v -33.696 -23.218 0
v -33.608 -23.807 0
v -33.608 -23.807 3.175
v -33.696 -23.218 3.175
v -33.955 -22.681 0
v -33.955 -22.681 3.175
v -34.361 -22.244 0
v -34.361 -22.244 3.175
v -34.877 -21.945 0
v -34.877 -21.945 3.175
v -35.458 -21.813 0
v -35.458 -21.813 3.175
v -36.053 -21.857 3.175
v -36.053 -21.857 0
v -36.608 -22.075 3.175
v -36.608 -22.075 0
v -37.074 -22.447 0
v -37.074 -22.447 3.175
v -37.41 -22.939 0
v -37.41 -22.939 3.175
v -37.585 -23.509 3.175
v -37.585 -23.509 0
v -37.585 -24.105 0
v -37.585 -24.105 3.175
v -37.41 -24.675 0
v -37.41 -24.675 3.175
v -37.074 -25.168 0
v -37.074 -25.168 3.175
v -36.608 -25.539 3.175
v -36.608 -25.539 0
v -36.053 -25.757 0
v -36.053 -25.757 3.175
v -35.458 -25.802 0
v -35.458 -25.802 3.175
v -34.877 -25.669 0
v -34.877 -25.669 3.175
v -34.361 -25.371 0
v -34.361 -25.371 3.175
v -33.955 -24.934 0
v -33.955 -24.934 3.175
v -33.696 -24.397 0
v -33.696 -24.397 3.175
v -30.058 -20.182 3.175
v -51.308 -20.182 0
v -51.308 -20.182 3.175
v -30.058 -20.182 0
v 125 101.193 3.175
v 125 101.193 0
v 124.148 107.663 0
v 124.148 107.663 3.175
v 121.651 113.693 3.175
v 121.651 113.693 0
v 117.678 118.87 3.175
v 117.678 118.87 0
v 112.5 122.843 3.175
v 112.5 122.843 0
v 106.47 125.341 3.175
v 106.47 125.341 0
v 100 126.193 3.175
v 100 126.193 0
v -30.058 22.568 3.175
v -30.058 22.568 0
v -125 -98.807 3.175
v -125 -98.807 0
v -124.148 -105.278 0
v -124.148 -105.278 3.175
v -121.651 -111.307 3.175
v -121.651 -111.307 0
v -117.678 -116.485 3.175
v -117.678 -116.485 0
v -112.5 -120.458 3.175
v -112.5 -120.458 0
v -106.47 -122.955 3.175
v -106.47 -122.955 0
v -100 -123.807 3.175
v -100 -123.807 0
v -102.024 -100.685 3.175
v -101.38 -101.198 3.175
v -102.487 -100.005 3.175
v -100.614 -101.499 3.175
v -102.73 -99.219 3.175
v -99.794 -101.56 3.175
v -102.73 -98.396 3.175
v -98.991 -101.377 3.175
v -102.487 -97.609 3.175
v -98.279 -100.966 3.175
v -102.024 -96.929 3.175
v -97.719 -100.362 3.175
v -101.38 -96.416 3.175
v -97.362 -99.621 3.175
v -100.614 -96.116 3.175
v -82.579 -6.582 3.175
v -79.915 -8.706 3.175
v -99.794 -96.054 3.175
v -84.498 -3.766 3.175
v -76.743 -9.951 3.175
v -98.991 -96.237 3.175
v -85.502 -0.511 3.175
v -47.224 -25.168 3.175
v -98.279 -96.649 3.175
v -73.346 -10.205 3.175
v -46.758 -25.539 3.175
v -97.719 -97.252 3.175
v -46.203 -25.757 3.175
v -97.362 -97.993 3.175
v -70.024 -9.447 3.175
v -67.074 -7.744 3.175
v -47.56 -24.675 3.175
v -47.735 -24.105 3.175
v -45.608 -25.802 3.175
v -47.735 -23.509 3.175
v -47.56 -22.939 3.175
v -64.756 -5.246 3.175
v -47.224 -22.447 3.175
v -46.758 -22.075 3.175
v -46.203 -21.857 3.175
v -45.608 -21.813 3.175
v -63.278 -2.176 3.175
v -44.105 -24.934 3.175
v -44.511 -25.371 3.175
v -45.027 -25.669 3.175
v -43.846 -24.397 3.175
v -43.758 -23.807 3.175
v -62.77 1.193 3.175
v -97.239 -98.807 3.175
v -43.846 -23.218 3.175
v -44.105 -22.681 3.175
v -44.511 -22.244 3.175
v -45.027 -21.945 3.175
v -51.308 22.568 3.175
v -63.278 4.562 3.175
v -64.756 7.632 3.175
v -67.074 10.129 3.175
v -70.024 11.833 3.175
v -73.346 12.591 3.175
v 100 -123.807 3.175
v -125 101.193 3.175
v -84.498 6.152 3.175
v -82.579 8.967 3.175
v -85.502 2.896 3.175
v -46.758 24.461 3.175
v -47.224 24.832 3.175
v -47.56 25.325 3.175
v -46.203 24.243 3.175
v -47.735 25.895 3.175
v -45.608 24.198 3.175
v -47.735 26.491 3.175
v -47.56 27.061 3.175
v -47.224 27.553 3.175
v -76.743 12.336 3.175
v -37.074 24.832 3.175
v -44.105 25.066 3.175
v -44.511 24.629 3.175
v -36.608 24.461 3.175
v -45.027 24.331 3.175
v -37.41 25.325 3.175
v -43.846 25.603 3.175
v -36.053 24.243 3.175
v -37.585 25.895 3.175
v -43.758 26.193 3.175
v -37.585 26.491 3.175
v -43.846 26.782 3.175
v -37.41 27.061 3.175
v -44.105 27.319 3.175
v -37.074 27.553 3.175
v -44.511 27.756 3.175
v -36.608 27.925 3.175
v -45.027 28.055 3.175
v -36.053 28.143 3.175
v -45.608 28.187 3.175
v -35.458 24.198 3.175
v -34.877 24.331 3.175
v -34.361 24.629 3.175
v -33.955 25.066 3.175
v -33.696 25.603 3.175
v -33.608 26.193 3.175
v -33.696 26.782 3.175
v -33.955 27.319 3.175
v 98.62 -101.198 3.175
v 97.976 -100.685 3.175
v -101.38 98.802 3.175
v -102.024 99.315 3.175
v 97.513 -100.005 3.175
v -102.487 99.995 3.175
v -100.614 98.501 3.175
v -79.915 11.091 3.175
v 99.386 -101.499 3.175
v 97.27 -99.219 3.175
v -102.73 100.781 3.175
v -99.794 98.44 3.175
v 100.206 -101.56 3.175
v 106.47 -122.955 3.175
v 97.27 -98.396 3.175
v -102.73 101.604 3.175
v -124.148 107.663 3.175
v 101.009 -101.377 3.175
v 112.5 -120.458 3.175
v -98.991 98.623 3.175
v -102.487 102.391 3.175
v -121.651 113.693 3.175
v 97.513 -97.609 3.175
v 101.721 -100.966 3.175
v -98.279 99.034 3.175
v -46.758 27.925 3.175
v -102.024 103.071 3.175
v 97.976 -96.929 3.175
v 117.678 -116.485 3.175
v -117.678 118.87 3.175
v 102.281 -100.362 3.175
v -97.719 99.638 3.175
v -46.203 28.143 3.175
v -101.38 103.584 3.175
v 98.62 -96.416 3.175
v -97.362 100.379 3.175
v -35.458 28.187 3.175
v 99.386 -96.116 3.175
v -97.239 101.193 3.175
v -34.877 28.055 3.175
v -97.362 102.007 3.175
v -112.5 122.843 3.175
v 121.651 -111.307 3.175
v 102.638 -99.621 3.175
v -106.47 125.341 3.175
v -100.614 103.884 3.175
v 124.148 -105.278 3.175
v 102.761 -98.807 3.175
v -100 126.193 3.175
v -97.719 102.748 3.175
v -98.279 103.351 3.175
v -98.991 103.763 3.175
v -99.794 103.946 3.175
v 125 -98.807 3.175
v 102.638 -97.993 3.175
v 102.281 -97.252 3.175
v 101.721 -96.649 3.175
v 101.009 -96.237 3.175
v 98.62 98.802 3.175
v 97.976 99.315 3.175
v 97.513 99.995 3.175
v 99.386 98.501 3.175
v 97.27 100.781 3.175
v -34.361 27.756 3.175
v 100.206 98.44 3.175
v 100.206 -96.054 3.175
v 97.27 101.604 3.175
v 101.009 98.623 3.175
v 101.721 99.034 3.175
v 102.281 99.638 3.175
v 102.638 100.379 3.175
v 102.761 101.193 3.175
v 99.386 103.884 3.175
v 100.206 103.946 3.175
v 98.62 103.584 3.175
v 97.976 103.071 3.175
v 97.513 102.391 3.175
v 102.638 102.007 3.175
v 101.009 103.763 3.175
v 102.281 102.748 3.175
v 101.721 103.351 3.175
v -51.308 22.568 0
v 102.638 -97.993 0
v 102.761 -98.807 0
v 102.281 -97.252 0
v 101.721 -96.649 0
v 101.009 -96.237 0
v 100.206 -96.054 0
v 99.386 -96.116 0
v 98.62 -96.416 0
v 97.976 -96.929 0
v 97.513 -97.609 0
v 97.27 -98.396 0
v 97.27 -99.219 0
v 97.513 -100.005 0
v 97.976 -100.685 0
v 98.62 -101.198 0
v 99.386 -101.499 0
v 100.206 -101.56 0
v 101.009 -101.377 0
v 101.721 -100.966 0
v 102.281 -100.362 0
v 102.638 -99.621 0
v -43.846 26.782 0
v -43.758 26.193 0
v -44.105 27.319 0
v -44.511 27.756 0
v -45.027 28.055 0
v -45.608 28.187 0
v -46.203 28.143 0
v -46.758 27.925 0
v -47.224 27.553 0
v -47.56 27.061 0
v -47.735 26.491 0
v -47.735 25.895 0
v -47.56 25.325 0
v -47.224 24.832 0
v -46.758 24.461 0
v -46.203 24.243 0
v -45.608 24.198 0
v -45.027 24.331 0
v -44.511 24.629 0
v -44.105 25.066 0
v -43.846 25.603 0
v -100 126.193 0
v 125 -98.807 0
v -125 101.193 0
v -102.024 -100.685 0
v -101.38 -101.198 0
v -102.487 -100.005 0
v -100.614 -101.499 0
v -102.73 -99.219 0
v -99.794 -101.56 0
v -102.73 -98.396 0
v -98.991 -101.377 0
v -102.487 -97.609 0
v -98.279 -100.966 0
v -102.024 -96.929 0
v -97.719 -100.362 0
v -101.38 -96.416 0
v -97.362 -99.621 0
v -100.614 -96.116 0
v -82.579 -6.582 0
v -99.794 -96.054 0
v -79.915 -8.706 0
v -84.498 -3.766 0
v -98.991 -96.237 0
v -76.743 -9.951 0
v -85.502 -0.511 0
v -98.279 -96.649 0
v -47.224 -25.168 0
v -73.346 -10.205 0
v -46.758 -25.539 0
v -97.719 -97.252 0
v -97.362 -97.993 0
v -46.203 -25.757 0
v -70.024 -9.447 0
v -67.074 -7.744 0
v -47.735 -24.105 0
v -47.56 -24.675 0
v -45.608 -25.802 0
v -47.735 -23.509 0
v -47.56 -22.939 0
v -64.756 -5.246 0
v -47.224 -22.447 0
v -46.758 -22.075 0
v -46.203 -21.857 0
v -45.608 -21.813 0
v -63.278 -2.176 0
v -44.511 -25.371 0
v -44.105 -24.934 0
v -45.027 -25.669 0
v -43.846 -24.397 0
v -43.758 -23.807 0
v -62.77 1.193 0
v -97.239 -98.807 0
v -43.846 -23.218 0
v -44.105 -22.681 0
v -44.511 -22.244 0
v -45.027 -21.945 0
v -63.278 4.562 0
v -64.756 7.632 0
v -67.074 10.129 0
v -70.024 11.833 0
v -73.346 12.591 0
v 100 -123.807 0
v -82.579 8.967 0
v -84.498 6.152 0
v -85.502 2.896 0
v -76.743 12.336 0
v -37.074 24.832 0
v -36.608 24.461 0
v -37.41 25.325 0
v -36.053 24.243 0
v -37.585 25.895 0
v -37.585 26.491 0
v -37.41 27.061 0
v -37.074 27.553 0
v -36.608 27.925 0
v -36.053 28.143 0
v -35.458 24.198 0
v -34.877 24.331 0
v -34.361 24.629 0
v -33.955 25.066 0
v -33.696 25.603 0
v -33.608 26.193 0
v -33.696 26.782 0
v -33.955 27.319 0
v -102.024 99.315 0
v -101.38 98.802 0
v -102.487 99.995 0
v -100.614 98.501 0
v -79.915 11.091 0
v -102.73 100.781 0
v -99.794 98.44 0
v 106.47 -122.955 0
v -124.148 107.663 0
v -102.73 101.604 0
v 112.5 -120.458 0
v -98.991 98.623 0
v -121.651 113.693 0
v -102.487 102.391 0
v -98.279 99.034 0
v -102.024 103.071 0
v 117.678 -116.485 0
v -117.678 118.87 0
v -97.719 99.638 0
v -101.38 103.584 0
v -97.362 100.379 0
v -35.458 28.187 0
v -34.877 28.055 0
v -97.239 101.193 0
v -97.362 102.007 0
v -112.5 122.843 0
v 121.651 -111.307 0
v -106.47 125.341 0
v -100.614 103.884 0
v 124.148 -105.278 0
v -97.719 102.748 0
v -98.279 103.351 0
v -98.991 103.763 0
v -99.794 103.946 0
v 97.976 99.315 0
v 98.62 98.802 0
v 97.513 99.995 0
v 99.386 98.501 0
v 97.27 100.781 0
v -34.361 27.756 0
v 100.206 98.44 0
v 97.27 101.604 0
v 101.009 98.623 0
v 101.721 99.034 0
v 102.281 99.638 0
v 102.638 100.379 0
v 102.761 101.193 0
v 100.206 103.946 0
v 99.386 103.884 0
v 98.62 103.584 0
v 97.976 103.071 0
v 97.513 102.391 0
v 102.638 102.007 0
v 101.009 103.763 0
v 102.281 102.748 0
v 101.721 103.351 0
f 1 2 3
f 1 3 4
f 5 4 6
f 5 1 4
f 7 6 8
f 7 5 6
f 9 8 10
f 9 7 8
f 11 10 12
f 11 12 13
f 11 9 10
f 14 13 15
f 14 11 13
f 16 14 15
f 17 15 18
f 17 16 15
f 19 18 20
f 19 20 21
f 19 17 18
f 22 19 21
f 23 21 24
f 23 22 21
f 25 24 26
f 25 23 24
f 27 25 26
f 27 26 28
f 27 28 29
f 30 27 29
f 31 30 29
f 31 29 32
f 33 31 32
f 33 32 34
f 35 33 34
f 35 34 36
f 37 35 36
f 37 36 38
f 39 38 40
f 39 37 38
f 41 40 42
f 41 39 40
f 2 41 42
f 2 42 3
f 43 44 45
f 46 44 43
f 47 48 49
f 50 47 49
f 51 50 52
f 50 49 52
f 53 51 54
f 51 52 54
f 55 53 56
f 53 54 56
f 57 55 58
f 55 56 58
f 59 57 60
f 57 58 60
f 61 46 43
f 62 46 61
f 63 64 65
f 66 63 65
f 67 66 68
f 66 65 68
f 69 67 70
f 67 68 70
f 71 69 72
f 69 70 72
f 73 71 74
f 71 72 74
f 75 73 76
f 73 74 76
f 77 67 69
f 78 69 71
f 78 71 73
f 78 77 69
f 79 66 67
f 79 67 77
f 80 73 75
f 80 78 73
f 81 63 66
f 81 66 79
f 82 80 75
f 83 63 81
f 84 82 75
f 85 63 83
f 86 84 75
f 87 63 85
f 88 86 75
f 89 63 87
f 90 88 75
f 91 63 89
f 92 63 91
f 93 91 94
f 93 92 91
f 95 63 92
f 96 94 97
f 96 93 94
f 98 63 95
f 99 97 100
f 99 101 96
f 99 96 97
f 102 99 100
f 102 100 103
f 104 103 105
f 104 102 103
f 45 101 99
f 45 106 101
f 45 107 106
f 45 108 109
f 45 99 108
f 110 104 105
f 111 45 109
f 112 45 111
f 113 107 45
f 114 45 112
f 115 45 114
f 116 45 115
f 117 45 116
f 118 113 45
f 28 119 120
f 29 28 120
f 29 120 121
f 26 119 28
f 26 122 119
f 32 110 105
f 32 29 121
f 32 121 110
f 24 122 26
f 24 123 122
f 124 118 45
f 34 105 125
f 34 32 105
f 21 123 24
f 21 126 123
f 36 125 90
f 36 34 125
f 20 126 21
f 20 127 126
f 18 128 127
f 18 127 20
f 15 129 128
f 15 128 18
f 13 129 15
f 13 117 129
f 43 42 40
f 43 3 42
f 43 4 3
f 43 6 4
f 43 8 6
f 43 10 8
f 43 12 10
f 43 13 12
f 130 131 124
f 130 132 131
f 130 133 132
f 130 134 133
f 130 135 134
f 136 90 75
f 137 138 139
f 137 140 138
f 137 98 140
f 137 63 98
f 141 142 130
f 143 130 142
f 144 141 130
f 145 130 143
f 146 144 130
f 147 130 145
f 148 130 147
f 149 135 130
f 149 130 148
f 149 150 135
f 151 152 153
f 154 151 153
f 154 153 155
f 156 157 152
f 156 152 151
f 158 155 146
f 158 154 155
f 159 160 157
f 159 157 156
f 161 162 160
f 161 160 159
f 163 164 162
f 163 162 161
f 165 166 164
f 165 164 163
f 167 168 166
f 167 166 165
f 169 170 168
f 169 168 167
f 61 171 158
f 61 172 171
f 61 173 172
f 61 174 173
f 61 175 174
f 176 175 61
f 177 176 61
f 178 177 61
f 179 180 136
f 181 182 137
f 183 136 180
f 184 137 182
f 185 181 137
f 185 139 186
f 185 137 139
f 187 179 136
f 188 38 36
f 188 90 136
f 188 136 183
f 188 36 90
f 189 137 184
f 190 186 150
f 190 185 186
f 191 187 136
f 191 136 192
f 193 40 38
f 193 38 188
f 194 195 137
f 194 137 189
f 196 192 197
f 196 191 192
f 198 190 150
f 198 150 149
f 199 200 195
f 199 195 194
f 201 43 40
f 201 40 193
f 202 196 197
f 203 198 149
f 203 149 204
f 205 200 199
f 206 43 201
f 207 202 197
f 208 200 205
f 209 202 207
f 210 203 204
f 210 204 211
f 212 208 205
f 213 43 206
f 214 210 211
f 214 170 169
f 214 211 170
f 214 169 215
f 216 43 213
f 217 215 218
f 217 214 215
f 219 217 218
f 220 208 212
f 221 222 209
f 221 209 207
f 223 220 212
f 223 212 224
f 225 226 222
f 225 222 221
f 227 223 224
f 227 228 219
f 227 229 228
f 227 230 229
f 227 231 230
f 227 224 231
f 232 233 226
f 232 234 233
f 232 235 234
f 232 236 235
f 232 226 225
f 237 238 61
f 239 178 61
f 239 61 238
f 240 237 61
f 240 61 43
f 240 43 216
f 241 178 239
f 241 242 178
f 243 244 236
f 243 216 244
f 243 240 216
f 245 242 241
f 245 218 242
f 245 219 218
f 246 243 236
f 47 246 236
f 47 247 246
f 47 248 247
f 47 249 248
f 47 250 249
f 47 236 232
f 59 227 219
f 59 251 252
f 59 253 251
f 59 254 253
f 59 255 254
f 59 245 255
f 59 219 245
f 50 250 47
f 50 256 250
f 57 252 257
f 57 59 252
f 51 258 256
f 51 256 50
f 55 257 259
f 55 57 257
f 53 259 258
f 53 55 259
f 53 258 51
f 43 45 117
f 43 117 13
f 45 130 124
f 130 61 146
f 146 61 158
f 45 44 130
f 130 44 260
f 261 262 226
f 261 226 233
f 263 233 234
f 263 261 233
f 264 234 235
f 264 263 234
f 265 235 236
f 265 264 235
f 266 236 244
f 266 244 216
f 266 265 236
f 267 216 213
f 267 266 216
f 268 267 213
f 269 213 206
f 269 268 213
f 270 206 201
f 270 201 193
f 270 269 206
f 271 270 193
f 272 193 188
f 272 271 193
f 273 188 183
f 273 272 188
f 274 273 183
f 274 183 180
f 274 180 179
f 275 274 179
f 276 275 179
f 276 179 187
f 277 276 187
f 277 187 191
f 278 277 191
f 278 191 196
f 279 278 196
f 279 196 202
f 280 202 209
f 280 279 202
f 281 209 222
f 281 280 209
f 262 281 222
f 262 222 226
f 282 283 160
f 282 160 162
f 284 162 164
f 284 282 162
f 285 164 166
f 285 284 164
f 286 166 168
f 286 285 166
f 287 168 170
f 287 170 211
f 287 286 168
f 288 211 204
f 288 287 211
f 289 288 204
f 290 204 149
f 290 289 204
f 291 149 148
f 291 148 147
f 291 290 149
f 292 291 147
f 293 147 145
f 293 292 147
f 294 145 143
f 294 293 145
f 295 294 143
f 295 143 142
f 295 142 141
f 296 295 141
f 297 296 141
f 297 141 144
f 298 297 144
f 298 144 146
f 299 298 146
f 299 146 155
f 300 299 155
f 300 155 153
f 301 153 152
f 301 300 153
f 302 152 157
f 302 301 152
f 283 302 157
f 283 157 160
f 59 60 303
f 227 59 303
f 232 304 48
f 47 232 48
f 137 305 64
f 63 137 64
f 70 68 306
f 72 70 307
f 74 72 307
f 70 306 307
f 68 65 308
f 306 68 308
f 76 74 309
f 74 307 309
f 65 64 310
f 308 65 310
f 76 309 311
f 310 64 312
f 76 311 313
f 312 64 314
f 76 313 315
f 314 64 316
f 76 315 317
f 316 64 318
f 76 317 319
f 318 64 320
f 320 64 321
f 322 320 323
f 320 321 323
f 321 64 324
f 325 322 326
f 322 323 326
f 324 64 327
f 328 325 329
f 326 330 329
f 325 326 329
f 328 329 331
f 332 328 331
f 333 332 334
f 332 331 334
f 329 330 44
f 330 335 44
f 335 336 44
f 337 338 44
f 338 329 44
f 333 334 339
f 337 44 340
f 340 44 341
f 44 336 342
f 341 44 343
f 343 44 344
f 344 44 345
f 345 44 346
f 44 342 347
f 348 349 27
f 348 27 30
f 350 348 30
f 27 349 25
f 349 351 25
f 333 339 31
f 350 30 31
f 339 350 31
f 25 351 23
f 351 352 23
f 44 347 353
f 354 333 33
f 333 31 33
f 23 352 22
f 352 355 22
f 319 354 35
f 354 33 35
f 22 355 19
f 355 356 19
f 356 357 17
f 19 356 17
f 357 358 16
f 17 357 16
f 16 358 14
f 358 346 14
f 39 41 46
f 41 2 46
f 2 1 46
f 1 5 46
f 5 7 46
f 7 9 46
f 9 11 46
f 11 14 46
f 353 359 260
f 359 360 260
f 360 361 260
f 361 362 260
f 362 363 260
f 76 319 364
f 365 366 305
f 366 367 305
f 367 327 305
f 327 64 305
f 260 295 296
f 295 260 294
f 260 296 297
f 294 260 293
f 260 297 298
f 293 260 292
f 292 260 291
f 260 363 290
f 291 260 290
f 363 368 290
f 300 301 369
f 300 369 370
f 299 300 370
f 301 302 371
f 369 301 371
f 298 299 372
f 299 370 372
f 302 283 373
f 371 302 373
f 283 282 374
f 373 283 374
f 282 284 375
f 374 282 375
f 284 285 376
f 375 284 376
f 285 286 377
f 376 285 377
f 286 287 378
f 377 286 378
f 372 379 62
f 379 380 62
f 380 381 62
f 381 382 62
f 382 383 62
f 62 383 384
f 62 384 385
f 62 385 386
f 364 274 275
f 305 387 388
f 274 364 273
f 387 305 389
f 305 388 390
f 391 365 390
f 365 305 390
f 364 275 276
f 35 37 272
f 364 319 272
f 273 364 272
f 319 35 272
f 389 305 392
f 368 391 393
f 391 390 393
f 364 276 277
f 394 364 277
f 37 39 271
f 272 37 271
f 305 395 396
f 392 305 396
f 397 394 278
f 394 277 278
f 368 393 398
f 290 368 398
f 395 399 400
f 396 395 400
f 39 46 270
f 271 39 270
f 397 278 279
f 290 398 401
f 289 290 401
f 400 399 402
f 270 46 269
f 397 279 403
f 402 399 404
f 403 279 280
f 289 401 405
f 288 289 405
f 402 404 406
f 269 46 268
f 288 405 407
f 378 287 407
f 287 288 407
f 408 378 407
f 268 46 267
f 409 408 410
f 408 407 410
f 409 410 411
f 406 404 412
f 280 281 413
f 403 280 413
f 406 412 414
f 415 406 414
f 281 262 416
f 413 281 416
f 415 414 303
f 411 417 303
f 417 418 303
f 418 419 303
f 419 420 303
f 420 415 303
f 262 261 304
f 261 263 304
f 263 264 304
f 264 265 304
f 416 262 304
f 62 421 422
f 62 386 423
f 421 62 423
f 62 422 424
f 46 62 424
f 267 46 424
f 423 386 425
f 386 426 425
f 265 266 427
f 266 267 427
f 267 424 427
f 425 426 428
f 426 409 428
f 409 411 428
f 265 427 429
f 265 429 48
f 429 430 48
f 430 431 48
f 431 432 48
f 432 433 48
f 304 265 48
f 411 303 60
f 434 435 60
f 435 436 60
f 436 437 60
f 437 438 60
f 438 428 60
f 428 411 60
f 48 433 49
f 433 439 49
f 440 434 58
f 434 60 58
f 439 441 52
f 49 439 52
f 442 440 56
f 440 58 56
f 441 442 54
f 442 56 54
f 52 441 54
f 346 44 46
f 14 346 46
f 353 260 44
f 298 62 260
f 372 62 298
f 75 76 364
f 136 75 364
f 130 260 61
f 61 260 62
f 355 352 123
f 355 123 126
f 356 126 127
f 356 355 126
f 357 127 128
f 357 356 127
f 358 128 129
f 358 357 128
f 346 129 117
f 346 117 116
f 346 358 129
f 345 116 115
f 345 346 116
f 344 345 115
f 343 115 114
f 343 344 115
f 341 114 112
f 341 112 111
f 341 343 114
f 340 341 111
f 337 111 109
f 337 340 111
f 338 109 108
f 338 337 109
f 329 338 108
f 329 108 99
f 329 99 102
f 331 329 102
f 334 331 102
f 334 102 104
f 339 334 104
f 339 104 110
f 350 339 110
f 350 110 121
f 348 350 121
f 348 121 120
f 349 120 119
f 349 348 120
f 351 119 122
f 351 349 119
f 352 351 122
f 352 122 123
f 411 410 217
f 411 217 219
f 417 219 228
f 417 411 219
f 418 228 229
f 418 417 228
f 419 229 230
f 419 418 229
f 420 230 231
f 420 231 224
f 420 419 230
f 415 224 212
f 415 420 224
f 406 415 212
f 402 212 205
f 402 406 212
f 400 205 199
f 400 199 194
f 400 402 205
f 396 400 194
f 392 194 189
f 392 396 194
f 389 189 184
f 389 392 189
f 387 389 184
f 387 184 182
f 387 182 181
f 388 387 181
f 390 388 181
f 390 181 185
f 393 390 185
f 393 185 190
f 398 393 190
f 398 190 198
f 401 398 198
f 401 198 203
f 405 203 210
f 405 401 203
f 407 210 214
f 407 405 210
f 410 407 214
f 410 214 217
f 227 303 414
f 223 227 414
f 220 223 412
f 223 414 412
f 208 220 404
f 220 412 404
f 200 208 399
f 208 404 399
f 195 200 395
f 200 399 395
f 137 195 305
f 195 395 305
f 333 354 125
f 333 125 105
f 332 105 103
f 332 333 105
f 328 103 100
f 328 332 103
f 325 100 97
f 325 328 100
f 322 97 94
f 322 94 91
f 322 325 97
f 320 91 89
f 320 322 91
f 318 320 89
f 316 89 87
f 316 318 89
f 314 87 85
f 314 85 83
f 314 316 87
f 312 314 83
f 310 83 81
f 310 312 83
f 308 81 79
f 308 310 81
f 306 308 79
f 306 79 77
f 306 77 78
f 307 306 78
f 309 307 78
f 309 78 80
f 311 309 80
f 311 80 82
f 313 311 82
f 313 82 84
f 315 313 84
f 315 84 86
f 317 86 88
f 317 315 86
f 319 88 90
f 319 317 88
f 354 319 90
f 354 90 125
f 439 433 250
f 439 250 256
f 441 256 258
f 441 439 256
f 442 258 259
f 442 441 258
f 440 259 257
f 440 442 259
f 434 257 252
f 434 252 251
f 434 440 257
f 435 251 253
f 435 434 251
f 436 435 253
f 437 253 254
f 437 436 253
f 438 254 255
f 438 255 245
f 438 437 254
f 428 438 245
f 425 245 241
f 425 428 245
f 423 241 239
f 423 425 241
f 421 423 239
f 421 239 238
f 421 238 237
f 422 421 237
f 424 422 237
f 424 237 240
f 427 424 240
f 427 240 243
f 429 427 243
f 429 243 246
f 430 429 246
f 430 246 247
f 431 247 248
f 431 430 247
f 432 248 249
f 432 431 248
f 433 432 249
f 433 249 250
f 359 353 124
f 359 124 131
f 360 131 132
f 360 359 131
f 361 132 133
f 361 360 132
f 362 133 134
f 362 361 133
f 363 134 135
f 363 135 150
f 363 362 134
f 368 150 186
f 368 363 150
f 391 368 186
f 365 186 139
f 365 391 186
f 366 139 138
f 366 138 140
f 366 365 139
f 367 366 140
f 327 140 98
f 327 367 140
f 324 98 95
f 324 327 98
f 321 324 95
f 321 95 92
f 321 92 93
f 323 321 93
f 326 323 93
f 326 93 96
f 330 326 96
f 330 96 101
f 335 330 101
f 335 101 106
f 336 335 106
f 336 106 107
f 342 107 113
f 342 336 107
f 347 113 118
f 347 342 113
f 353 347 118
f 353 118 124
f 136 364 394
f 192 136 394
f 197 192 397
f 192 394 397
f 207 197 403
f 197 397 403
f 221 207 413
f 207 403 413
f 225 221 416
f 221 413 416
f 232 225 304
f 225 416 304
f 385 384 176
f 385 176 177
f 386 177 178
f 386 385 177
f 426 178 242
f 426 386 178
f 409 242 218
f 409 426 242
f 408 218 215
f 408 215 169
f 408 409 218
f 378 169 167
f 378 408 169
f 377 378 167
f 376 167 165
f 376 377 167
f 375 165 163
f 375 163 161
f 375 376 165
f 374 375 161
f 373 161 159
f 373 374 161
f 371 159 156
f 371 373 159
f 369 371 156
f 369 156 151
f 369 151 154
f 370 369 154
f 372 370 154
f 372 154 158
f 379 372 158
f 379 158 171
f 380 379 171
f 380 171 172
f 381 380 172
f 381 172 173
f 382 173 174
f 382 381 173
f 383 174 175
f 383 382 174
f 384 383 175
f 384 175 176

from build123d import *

# Parameters (mm, degrees)
F0_R     = 2.7608867496
F0_R_2   = 2
F0_W     = 21.25
F0_H     = 42.75
F0_R_3   = 11.43
F1_DEPTH = 3.175


# Not quite as in the source:
# - a length typed as a fraction of an inch, garbled in the dataset ("3 / 203.2 mm" for 3/8 in), is restored


with BuildPart() as f1:
    # F0 (on Top) → F1 (new body)
    with BuildSketch(Plane.XY):
        with BuildLine():
            Line((100, 126.1928240007), (-100, 126.1928240007))
            ThreePointArc((-100, 126.1928240007), (-117.6776695297, 118.8704935303), (-125, 101.1928240007))
            Line((-125, 101.1928240007), (-125, -98.8071759993))
            ThreePointArc((-125, -98.8071759993), (-117.6776695297, -116.484845529), (-100, -123.8071759993))
            Line((-100, -123.8071759993), (100, -123.8071759993))
            ThreePointArc((100, -123.8071759993), (117.6776695297, -116.484845529), (125, -98.8071759993))
            Line((125, -98.8071759993), (125, 101.1928240007))
            ThreePointArc((125, 101.1928240007), (117.6776695297, 118.8704935303), (100, 126.1928240007))
        make_face()
        with Locations((-100, -98.8071759993)):
            Circle(F0_R, mode=Mode.SUBTRACT)
        with Locations((-45.7576233894, -23.8071759993)):
            Circle(F0_R_2, mode=Mode.SUBTRACT)
        with Locations((-35.6076233894, -23.8071759993)):
            Circle(F0_R_2, mode=Mode.SUBTRACT)
        with Locations((-40.6826233894, 1.1928240007)):
            Rectangle(F0_W, F0_H, mode=Mode.SUBTRACT)
        with Locations((100, -98.8071759993)):
            Circle(F0_R, mode=Mode.SUBTRACT)
        with Locations((-74.2, 1.1928240007)):
            Circle(F0_R_3, mode=Mode.SUBTRACT)
        with Locations((-45.7576233894, 26.1928240007)):
            Circle(F0_R_2, mode=Mode.SUBTRACT)
        with Locations((-35.6076233894, 26.1928240007)):
            Circle(F0_R_2, mode=Mode.SUBTRACT)
        with Locations((-100, 101.1928240007)):
            Circle(F0_R, mode=Mode.SUBTRACT)
        with Locations((100, 101.1928240007)):
            Circle(F0_R, mode=Mode.SUBTRACT)
    extrude(amount=F1_DEPTH)


solid = f1.part
